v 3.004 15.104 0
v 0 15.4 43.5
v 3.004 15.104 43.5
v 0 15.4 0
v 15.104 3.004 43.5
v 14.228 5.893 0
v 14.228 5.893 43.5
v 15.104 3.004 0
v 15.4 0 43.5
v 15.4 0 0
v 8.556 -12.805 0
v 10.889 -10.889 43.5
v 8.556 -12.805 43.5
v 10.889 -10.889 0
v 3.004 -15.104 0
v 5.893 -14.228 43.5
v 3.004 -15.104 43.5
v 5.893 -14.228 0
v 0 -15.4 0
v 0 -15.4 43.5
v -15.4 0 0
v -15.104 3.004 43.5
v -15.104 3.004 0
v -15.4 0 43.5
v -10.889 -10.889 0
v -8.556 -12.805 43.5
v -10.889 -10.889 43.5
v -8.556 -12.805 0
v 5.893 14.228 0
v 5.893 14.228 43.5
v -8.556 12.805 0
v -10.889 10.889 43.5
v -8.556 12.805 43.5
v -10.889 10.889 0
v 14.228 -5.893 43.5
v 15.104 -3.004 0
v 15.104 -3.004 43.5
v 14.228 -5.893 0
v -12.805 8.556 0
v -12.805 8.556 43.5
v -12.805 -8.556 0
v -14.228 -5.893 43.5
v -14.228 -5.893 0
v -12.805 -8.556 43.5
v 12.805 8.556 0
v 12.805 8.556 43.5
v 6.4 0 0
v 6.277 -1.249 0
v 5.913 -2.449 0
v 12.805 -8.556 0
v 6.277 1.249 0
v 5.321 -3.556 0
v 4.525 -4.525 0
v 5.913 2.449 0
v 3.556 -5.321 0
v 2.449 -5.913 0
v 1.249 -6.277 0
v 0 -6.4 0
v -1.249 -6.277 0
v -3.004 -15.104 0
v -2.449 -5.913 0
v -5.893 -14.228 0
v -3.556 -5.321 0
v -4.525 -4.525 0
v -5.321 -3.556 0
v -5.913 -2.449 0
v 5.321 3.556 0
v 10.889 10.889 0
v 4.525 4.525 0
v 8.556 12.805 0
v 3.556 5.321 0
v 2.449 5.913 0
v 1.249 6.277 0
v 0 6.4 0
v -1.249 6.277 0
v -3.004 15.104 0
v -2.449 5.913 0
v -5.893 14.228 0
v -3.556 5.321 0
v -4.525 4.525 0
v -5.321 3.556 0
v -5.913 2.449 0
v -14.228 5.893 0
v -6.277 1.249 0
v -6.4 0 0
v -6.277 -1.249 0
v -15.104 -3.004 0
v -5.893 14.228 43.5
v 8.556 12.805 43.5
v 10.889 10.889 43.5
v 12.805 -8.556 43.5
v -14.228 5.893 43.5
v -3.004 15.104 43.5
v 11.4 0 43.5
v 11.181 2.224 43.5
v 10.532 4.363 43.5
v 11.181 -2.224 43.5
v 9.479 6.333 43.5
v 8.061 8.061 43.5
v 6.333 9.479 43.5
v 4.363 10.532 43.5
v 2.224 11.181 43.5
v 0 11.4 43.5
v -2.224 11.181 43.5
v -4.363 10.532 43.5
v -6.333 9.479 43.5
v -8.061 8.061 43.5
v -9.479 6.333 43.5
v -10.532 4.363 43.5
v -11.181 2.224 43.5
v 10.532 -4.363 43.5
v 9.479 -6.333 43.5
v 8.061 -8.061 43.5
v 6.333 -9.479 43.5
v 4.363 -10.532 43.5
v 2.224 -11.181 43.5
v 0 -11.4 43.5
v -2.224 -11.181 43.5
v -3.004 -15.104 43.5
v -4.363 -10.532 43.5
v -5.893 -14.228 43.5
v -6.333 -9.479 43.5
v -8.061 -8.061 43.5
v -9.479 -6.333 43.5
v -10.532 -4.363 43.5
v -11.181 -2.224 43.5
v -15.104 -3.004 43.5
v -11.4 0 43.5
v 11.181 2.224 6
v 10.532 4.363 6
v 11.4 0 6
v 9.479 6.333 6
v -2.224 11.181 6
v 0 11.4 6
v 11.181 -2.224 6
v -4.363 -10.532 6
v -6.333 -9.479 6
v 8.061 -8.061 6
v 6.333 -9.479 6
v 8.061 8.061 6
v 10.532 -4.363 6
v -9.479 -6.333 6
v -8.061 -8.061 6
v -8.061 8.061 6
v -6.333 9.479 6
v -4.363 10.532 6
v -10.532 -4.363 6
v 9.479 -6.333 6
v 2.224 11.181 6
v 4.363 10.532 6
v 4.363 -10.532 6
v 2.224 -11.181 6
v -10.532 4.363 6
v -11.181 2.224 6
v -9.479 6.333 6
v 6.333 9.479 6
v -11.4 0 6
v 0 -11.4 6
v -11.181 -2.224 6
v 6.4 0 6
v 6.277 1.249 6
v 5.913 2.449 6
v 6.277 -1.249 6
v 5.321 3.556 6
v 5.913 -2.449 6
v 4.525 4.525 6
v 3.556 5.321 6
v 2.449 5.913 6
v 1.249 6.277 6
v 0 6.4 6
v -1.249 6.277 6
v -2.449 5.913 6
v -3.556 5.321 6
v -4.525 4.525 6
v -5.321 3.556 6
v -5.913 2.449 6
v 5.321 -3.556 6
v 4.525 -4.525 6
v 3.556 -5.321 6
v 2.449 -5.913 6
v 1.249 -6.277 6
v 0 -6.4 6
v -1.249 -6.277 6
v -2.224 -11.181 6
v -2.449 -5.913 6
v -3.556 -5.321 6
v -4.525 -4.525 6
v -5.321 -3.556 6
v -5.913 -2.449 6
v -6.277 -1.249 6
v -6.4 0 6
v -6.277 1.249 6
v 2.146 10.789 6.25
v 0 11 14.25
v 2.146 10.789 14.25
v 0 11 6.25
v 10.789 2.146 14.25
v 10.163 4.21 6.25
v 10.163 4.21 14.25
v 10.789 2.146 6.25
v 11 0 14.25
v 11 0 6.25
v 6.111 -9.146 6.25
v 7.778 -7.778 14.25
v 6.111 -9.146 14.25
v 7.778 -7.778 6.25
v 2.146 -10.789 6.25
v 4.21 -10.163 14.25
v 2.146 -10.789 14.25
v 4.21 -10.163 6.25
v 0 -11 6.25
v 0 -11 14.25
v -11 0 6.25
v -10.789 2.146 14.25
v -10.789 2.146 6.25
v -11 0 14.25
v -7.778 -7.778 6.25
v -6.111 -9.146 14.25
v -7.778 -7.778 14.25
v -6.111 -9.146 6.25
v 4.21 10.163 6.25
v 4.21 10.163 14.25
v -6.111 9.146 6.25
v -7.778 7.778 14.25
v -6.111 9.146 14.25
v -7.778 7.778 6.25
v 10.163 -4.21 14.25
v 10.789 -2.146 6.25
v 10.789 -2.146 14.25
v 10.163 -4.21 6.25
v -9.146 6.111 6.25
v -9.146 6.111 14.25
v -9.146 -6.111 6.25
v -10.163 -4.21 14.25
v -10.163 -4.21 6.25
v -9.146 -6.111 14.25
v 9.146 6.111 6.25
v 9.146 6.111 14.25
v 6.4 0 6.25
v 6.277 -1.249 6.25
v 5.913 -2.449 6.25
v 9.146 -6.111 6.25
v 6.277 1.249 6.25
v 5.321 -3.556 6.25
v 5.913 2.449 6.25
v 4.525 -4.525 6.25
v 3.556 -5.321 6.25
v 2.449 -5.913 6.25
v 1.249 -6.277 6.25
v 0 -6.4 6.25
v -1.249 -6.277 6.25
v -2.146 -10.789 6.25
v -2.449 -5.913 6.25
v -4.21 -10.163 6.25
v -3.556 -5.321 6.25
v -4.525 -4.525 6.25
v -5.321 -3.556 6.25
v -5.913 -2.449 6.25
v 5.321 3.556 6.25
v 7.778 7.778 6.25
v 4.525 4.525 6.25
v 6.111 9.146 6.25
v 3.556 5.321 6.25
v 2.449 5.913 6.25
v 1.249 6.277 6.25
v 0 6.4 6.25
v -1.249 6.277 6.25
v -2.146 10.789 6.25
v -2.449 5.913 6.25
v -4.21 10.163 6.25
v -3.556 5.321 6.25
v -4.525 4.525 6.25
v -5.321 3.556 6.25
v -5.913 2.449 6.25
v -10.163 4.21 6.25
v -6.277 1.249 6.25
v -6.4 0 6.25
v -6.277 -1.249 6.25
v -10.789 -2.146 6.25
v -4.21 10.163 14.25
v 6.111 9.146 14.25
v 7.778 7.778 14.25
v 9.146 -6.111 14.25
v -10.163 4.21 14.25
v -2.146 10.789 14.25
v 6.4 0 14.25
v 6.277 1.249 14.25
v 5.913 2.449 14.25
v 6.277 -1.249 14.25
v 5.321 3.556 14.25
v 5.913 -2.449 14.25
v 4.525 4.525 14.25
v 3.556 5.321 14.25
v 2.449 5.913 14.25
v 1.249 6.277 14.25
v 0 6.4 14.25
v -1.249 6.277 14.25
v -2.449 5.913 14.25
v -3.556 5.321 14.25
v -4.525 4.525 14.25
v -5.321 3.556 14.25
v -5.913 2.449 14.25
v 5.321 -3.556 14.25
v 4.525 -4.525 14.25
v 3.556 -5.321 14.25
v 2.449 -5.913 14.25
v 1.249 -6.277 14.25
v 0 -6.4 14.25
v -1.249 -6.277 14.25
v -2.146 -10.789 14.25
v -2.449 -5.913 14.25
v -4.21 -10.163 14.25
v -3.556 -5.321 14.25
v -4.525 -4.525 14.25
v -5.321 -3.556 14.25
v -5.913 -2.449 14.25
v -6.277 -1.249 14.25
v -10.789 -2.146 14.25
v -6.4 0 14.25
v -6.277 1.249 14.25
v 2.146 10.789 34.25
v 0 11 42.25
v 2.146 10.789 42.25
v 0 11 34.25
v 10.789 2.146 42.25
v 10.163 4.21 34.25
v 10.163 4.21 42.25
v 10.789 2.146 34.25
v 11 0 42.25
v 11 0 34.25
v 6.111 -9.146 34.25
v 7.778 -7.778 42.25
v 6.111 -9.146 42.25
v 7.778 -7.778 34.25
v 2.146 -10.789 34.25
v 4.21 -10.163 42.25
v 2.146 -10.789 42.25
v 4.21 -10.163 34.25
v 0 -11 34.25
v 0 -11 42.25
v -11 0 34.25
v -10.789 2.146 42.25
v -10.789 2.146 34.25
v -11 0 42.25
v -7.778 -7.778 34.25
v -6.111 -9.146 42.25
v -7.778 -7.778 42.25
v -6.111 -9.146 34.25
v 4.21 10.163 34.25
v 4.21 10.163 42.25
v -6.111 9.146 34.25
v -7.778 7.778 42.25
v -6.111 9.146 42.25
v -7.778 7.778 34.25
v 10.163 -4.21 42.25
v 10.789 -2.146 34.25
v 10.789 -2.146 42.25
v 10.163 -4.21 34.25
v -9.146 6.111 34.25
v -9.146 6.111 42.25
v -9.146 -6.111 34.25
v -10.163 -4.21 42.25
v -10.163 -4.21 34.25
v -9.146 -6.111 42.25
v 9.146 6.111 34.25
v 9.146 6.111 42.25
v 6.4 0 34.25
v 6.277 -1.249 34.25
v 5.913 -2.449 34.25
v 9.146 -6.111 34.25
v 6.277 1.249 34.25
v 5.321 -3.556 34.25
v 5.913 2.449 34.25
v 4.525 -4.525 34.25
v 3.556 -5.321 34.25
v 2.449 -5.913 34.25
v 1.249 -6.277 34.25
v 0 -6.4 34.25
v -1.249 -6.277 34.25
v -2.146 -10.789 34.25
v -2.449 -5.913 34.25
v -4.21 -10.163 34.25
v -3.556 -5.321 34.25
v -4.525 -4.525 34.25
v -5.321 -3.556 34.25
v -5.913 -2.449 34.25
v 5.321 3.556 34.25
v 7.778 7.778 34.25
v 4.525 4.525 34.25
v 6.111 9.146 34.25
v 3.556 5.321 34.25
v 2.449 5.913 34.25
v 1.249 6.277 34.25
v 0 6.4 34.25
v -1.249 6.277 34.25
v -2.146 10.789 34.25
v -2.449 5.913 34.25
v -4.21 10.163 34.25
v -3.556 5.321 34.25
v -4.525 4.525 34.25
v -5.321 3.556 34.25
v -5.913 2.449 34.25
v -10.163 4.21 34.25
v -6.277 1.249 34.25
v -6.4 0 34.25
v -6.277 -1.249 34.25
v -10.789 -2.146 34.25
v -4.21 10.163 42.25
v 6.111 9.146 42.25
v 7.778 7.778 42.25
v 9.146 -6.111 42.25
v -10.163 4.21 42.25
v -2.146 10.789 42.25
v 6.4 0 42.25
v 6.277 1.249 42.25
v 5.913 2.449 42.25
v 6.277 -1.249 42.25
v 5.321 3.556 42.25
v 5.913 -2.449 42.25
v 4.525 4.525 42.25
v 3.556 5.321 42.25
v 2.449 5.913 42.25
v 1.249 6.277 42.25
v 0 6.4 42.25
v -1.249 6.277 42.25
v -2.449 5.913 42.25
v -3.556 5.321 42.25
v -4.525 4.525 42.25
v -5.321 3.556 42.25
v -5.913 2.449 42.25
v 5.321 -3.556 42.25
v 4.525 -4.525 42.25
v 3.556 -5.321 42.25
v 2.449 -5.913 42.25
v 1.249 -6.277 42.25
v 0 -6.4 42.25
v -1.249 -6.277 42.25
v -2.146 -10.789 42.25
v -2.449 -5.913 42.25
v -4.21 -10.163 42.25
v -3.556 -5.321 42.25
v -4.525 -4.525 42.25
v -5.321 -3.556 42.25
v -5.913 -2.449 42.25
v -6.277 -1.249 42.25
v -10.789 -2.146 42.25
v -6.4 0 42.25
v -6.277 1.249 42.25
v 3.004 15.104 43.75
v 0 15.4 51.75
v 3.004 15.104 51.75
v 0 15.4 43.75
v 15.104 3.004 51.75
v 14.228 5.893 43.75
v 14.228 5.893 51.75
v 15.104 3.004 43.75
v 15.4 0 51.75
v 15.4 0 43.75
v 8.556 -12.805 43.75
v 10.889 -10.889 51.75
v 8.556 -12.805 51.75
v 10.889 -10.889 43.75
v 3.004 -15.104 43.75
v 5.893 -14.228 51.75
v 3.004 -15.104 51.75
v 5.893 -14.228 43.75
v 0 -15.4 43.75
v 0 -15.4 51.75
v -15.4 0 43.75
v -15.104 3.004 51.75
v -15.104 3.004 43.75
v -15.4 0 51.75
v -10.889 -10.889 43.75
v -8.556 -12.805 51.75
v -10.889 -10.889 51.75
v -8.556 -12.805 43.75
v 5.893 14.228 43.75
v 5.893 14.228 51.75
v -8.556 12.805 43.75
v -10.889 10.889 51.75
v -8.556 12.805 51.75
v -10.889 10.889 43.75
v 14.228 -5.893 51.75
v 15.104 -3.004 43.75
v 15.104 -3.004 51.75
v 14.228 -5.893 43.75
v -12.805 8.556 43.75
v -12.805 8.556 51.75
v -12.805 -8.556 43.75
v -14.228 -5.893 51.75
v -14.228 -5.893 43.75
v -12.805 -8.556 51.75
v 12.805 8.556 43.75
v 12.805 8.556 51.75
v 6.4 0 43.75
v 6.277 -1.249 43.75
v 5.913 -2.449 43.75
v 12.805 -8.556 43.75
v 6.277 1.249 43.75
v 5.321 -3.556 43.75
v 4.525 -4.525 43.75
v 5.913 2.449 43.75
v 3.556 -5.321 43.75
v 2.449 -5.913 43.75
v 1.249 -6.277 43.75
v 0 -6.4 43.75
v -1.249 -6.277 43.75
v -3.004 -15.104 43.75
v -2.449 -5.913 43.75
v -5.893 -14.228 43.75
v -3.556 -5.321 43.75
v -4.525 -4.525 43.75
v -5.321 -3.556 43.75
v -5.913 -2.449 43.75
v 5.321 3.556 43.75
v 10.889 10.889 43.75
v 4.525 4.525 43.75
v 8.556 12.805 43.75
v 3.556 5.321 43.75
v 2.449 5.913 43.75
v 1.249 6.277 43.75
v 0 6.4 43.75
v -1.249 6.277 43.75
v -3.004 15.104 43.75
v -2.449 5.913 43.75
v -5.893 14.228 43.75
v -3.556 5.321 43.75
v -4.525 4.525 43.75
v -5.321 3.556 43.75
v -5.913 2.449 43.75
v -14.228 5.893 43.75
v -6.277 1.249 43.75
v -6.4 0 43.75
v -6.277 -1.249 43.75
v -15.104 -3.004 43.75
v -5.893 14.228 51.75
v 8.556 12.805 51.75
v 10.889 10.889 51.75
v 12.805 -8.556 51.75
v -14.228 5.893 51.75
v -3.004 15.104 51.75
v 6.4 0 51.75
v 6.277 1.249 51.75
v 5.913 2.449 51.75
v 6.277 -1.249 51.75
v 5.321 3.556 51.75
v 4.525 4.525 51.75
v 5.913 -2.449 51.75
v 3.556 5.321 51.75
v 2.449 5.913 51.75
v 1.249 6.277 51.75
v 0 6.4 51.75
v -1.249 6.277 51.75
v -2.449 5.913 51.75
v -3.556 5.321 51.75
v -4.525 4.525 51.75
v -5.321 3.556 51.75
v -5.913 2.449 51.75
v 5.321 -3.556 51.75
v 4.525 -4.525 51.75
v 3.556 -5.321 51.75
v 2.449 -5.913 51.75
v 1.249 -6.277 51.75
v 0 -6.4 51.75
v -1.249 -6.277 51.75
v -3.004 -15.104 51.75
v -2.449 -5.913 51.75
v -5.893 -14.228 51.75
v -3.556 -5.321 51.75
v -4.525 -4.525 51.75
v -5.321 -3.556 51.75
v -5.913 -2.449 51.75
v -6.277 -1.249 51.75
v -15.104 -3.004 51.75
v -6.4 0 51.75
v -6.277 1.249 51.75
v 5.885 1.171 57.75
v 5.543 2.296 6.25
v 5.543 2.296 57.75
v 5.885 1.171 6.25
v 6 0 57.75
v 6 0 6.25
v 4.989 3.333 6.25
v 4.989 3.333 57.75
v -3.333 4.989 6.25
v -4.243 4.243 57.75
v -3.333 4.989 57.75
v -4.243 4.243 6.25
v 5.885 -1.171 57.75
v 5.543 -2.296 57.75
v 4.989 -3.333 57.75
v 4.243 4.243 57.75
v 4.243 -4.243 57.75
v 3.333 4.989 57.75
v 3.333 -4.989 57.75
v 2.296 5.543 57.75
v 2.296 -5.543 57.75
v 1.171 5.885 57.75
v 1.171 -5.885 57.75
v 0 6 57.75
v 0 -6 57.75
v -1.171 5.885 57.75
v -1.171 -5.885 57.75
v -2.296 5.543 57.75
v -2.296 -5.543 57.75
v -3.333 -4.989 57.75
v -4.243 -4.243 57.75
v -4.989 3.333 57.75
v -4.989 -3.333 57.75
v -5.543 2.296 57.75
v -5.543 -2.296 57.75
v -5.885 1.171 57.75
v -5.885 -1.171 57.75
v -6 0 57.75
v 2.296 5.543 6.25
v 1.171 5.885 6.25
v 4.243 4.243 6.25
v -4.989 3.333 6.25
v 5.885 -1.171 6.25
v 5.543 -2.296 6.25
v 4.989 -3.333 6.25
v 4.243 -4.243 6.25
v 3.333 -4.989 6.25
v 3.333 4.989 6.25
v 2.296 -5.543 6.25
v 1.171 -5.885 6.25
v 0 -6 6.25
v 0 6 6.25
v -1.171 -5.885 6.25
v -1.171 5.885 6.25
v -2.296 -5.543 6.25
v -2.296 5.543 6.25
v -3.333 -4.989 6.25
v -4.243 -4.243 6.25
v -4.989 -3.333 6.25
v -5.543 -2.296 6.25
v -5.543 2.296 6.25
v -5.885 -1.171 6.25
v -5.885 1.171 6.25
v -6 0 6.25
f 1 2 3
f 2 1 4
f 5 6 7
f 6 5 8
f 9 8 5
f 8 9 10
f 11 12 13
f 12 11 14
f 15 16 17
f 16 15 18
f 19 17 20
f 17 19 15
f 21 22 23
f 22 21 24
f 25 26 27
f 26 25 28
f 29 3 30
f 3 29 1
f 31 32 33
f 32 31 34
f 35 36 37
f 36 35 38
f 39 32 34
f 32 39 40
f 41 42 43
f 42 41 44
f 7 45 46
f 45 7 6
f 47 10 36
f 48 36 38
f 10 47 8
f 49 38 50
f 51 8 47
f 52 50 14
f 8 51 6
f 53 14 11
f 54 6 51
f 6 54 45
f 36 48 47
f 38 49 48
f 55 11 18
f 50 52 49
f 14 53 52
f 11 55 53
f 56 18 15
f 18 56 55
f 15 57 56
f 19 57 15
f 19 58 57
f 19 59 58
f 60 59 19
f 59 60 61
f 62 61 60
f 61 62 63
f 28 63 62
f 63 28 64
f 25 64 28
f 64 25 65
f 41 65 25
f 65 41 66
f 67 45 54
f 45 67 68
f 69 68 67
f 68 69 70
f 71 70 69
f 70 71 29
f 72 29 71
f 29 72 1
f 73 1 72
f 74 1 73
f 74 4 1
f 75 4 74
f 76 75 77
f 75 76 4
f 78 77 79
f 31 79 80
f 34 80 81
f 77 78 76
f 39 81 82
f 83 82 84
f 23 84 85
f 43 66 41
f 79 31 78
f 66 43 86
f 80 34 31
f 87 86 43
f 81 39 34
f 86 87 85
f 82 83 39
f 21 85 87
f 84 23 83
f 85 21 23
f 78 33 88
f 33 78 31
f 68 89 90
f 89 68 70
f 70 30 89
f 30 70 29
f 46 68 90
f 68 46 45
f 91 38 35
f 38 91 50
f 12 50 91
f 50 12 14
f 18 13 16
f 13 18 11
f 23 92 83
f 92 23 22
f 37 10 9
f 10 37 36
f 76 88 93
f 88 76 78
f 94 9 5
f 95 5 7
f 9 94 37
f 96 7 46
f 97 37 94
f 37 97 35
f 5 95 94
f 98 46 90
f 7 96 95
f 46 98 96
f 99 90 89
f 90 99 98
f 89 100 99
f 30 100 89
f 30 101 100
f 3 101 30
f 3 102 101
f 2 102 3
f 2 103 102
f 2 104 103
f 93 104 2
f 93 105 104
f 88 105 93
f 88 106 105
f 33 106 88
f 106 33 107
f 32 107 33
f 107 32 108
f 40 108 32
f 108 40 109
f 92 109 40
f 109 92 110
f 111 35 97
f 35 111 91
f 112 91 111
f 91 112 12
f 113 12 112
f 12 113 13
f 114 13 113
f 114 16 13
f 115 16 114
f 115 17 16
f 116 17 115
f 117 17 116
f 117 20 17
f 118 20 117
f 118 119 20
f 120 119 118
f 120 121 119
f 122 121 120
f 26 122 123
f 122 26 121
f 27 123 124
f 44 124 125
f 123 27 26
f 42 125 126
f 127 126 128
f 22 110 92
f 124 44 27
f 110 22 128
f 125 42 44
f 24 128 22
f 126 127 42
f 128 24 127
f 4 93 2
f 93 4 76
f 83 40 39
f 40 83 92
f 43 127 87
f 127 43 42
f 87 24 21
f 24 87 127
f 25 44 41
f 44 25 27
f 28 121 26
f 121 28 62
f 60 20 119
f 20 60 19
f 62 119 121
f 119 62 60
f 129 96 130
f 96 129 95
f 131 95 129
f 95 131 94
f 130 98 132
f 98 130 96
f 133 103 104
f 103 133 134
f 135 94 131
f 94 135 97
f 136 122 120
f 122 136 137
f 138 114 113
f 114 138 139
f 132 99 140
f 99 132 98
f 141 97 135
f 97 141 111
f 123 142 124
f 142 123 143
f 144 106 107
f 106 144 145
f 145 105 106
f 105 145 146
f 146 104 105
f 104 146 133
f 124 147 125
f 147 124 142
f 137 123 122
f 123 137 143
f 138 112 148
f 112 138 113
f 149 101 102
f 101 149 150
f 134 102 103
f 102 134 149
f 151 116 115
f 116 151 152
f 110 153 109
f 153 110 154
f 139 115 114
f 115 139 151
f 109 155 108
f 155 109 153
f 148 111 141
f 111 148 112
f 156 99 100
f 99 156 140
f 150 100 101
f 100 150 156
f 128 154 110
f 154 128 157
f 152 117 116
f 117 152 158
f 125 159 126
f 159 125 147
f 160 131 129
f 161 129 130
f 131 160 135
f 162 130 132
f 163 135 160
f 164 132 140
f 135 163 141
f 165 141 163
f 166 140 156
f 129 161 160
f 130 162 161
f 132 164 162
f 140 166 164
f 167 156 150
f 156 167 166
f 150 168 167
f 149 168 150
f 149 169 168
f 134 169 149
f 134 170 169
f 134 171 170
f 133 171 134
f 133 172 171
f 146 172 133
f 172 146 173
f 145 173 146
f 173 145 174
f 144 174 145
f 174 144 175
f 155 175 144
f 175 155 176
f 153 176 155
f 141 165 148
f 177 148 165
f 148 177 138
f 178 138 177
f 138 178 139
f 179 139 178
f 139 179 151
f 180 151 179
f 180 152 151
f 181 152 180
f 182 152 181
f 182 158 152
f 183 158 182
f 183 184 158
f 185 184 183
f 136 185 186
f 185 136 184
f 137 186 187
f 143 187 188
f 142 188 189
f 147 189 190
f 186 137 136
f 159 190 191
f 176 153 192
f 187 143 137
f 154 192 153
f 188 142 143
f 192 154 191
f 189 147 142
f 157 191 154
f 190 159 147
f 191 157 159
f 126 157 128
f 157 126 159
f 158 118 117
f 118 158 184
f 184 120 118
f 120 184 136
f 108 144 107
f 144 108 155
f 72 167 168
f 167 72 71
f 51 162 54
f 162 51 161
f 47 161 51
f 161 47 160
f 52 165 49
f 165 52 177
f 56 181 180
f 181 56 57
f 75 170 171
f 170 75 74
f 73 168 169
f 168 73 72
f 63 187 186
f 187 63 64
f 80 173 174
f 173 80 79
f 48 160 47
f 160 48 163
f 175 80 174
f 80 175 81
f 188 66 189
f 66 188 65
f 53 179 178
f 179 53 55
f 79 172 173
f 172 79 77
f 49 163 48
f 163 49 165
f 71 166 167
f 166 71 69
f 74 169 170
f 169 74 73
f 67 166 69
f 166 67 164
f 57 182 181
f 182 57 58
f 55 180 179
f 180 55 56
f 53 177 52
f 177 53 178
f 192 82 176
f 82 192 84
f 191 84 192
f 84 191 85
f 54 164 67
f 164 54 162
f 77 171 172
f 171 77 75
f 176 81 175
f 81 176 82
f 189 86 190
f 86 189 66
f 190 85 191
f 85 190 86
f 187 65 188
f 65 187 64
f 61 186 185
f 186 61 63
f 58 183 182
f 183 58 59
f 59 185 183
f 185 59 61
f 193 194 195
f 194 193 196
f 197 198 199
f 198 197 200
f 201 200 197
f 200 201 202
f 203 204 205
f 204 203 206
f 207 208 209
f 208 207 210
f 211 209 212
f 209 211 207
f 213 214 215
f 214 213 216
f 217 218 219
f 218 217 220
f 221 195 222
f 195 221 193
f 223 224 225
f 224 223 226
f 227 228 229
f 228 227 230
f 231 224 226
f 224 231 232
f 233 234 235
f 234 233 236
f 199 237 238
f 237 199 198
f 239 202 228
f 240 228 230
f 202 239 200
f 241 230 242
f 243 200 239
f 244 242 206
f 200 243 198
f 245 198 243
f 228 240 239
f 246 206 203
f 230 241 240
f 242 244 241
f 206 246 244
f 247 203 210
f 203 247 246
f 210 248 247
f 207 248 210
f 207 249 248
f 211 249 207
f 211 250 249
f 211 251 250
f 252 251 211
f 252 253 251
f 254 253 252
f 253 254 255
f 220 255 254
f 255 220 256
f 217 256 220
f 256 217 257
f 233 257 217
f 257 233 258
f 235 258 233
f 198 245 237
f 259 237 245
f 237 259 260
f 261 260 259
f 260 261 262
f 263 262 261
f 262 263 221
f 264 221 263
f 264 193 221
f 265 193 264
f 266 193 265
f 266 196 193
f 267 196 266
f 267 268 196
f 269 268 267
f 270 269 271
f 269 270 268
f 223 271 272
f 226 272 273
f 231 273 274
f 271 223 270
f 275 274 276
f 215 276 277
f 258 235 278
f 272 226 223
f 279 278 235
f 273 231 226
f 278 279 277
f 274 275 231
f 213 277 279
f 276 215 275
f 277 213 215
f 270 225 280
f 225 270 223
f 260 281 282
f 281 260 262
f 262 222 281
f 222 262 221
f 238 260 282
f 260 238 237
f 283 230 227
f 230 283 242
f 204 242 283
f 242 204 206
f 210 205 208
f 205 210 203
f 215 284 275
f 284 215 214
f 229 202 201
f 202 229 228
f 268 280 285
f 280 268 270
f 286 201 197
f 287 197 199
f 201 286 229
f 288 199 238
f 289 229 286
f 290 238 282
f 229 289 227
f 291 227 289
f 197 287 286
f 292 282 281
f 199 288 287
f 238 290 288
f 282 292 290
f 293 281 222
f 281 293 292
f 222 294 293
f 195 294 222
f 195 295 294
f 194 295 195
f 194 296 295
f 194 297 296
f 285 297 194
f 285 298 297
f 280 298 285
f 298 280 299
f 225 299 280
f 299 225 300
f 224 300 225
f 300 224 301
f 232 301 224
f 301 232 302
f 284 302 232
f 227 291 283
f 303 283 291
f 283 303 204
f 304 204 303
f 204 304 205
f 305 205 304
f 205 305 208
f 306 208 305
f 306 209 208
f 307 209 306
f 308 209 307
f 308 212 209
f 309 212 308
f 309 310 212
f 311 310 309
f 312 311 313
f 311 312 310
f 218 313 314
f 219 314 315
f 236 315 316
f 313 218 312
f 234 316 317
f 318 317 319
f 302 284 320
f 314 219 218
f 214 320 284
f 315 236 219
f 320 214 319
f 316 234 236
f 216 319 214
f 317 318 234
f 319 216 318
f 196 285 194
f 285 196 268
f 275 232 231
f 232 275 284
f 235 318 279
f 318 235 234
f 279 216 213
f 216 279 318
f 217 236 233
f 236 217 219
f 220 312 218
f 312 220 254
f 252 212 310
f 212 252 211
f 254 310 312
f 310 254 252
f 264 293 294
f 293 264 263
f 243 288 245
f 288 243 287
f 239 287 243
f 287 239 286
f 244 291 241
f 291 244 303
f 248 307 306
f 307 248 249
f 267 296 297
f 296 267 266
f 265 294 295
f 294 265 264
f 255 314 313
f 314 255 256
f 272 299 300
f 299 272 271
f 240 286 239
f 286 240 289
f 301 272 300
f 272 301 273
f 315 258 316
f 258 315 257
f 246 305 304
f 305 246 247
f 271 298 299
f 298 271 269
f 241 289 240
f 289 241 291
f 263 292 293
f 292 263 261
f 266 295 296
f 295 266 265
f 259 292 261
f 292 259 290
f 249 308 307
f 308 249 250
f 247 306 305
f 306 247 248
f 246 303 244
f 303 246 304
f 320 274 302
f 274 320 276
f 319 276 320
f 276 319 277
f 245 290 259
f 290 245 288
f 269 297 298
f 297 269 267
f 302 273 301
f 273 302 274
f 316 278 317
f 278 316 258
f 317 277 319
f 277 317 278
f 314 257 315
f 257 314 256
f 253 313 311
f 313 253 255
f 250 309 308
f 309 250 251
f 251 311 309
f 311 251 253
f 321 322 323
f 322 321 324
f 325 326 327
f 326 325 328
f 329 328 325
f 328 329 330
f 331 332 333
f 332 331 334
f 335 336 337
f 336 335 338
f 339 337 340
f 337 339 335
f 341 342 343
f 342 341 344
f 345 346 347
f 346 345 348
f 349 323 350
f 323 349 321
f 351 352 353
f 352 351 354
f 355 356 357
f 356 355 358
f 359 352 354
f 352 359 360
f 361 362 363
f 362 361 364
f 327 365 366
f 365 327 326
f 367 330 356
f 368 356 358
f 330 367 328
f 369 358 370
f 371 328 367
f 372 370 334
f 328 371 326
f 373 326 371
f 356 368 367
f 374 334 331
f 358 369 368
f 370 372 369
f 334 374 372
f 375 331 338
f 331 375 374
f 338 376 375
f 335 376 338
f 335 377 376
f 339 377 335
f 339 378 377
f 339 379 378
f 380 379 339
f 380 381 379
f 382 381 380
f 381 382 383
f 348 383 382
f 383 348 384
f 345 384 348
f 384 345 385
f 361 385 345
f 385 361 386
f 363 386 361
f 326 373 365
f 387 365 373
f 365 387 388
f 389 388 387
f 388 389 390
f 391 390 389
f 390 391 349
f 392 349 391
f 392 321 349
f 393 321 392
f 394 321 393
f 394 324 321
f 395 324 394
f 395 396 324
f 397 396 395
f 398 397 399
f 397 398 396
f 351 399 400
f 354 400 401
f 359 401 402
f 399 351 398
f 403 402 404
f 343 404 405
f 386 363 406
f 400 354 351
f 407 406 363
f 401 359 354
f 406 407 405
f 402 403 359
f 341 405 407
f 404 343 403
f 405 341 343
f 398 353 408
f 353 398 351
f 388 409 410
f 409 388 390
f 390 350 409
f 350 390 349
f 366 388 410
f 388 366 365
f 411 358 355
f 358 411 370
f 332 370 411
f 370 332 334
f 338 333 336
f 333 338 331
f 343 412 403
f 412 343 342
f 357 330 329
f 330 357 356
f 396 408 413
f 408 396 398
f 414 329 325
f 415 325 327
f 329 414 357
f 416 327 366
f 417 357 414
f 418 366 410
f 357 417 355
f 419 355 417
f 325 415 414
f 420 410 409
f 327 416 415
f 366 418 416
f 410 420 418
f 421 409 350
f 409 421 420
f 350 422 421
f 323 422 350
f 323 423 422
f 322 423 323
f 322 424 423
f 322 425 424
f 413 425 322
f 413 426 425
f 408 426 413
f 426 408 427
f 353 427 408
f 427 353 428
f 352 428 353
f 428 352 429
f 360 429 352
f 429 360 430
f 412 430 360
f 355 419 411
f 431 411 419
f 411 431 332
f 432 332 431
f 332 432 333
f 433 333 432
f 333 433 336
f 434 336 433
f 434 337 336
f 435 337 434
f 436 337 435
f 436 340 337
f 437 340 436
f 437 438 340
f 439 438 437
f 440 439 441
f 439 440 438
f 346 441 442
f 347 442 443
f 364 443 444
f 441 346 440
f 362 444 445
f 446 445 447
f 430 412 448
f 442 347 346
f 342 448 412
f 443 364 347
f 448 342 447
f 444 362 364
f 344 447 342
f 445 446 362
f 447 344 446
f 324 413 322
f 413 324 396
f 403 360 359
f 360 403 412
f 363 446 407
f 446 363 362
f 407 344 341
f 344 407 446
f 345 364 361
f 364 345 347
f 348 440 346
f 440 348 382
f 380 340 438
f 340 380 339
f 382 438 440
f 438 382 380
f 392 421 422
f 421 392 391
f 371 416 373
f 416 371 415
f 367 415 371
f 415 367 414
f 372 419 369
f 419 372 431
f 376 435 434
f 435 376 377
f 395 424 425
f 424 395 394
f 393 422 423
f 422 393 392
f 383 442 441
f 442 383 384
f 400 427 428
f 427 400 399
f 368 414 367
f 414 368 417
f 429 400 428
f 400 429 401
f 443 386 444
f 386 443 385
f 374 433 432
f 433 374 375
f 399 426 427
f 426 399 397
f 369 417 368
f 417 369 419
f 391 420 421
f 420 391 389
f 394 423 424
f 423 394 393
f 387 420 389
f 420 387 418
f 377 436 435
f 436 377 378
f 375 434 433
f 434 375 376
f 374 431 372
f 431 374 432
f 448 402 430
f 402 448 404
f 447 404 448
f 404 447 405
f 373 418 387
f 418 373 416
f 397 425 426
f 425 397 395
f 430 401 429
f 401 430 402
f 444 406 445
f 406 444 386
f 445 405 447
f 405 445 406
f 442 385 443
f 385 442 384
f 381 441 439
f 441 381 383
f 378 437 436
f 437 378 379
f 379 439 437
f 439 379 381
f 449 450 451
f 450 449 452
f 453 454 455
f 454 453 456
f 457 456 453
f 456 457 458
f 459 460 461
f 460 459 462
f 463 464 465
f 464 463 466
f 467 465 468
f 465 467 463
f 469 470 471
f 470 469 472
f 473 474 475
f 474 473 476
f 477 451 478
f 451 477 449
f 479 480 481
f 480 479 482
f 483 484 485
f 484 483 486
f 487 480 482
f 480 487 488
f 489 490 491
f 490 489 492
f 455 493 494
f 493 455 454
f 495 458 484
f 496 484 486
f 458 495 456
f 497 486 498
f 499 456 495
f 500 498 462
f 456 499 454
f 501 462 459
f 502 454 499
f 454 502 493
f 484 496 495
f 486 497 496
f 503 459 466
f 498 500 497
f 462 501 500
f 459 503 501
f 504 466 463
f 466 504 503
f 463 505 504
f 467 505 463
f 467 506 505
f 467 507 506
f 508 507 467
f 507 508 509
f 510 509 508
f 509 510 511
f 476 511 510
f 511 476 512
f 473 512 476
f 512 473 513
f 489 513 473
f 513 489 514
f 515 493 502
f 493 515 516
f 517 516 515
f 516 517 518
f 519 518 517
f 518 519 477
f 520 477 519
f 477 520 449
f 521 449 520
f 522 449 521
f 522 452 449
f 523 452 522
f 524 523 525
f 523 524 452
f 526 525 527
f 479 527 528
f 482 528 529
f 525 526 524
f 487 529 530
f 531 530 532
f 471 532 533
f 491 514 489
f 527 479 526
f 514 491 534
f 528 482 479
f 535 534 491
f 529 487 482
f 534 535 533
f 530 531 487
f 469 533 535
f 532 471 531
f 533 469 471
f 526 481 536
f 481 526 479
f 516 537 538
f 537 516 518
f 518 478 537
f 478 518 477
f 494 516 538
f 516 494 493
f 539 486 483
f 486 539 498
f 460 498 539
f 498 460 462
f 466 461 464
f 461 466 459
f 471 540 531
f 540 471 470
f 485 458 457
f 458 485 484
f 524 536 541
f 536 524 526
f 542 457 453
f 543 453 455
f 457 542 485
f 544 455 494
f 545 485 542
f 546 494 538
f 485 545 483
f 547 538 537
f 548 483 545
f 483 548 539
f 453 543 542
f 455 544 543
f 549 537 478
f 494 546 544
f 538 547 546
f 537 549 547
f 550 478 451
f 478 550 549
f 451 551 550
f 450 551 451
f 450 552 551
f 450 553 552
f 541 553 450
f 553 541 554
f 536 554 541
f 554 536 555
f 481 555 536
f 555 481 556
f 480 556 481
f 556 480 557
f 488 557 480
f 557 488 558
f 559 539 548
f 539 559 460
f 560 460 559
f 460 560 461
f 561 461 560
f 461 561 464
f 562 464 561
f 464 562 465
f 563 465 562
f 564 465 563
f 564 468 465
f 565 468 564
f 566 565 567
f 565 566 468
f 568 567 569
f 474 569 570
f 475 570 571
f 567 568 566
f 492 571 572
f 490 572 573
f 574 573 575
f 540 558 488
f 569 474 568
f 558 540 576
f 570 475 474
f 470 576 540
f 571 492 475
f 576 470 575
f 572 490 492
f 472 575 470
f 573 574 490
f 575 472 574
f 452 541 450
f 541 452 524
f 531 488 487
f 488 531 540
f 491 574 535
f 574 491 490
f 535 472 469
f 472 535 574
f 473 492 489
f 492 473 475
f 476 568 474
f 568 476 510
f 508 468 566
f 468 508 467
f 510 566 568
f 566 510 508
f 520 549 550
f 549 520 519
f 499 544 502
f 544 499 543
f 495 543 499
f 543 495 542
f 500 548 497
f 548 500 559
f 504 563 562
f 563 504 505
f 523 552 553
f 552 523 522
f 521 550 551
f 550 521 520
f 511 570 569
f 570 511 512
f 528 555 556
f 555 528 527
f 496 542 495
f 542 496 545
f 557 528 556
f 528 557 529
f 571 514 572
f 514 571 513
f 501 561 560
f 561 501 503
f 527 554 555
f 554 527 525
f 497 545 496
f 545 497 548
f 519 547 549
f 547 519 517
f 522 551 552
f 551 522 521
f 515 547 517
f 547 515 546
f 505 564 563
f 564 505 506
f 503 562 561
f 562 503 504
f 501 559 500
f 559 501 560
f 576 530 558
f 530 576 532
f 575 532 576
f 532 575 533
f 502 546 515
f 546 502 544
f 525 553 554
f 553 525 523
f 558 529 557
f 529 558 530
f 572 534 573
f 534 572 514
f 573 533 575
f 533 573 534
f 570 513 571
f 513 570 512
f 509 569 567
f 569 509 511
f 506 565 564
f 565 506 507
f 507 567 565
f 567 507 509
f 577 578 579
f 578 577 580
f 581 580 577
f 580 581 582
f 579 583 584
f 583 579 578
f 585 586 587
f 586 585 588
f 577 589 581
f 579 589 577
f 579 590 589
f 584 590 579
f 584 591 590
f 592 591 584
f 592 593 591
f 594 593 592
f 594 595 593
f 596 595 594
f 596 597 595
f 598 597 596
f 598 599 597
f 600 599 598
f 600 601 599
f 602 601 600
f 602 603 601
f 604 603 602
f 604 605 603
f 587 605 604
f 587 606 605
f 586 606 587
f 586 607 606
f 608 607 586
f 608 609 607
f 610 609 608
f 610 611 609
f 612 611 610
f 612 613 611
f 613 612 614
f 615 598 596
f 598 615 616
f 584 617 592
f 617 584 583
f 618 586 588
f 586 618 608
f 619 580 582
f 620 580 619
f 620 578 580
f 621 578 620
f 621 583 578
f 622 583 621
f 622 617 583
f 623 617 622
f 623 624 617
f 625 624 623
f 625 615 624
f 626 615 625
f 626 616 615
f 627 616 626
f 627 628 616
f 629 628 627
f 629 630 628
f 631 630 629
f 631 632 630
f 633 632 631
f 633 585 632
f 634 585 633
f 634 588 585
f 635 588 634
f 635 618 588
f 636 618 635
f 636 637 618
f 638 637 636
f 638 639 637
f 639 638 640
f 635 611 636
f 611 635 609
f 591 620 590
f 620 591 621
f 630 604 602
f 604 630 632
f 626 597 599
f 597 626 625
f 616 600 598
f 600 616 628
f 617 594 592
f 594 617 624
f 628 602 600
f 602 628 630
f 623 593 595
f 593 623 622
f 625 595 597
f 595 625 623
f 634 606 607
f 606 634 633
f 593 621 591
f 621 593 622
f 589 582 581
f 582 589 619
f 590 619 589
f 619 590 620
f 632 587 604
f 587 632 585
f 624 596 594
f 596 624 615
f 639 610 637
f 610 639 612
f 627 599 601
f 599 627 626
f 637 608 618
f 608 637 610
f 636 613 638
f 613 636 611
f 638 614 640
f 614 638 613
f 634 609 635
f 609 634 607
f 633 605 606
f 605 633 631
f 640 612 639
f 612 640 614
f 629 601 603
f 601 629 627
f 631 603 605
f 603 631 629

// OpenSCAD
$fn = 32;

// ------------------------------------------------------------------------
// Shaft station: cup d30.8 x 43.5 mm, shaft d12
// Every part is its own module, assembly() places every instance.
// ------------------------------------------------------------------------

// --- part 1 ---
module housing_cup() {
  difference() {
    cylinder(h = 43.5, d = 30.8);
    translate([0, 0, 6]) cylinder(h = 38.5, d = 22.8);
    translate([0, 0, -1]) cylinder(h = 8, d = 12.8);
  }
}

// --- part 2 ---
module bearing_lower() {
  difference() {
      translate([0, 0, 0]) cylinder(h = 8, d = 22);
      translate([0, 0, -1]) cylinder(h = 10, d = 12.8);
    }
}

// --- part 3 ---
module bearing_upper() {
  difference() {
      translate([0, 0, 0]) cylinder(h = 8, d = 22);
      translate([0, 0, -1]) cylinder(h = 10, d = 12.8);
    }
}

// --- part 4 ---
module station_shaft() {
  translate([0, 0, -25.75]) cylinder(h = 51.5, d = 12);
}

// --- part 5 ---
module station_cover() {
  difference() {
    cylinder(h = 8, d = 30.8);
    translate([0, 0, -1]) cylinder(h = 10, d = 12.8);
  }
}

// --- assembly ---
module assembly() {
  color([0.80, 0.24, 0.20]) translate([0, 0, 0]) rotate([0, 0, 0]) housing_cup();
  color([0.20, 0.45, 0.75]) translate([0, 0, 6.25]) rotate([0, 0, 0]) bearing_lower();
  color([0.25, 0.62, 0.32]) translate([0, 0, 34.25]) rotate([0, 0, 0]) bearing_upper();
  color([0.92, 0.70, 0.18]) translate([0, 0, 32]) rotate([0, 0, 0]) station_shaft();
  color([0.58, 0.35, 0.70]) translate([0, 0, 43.75]) rotate([0, 0, 0]) station_cover();
}

assembly();
